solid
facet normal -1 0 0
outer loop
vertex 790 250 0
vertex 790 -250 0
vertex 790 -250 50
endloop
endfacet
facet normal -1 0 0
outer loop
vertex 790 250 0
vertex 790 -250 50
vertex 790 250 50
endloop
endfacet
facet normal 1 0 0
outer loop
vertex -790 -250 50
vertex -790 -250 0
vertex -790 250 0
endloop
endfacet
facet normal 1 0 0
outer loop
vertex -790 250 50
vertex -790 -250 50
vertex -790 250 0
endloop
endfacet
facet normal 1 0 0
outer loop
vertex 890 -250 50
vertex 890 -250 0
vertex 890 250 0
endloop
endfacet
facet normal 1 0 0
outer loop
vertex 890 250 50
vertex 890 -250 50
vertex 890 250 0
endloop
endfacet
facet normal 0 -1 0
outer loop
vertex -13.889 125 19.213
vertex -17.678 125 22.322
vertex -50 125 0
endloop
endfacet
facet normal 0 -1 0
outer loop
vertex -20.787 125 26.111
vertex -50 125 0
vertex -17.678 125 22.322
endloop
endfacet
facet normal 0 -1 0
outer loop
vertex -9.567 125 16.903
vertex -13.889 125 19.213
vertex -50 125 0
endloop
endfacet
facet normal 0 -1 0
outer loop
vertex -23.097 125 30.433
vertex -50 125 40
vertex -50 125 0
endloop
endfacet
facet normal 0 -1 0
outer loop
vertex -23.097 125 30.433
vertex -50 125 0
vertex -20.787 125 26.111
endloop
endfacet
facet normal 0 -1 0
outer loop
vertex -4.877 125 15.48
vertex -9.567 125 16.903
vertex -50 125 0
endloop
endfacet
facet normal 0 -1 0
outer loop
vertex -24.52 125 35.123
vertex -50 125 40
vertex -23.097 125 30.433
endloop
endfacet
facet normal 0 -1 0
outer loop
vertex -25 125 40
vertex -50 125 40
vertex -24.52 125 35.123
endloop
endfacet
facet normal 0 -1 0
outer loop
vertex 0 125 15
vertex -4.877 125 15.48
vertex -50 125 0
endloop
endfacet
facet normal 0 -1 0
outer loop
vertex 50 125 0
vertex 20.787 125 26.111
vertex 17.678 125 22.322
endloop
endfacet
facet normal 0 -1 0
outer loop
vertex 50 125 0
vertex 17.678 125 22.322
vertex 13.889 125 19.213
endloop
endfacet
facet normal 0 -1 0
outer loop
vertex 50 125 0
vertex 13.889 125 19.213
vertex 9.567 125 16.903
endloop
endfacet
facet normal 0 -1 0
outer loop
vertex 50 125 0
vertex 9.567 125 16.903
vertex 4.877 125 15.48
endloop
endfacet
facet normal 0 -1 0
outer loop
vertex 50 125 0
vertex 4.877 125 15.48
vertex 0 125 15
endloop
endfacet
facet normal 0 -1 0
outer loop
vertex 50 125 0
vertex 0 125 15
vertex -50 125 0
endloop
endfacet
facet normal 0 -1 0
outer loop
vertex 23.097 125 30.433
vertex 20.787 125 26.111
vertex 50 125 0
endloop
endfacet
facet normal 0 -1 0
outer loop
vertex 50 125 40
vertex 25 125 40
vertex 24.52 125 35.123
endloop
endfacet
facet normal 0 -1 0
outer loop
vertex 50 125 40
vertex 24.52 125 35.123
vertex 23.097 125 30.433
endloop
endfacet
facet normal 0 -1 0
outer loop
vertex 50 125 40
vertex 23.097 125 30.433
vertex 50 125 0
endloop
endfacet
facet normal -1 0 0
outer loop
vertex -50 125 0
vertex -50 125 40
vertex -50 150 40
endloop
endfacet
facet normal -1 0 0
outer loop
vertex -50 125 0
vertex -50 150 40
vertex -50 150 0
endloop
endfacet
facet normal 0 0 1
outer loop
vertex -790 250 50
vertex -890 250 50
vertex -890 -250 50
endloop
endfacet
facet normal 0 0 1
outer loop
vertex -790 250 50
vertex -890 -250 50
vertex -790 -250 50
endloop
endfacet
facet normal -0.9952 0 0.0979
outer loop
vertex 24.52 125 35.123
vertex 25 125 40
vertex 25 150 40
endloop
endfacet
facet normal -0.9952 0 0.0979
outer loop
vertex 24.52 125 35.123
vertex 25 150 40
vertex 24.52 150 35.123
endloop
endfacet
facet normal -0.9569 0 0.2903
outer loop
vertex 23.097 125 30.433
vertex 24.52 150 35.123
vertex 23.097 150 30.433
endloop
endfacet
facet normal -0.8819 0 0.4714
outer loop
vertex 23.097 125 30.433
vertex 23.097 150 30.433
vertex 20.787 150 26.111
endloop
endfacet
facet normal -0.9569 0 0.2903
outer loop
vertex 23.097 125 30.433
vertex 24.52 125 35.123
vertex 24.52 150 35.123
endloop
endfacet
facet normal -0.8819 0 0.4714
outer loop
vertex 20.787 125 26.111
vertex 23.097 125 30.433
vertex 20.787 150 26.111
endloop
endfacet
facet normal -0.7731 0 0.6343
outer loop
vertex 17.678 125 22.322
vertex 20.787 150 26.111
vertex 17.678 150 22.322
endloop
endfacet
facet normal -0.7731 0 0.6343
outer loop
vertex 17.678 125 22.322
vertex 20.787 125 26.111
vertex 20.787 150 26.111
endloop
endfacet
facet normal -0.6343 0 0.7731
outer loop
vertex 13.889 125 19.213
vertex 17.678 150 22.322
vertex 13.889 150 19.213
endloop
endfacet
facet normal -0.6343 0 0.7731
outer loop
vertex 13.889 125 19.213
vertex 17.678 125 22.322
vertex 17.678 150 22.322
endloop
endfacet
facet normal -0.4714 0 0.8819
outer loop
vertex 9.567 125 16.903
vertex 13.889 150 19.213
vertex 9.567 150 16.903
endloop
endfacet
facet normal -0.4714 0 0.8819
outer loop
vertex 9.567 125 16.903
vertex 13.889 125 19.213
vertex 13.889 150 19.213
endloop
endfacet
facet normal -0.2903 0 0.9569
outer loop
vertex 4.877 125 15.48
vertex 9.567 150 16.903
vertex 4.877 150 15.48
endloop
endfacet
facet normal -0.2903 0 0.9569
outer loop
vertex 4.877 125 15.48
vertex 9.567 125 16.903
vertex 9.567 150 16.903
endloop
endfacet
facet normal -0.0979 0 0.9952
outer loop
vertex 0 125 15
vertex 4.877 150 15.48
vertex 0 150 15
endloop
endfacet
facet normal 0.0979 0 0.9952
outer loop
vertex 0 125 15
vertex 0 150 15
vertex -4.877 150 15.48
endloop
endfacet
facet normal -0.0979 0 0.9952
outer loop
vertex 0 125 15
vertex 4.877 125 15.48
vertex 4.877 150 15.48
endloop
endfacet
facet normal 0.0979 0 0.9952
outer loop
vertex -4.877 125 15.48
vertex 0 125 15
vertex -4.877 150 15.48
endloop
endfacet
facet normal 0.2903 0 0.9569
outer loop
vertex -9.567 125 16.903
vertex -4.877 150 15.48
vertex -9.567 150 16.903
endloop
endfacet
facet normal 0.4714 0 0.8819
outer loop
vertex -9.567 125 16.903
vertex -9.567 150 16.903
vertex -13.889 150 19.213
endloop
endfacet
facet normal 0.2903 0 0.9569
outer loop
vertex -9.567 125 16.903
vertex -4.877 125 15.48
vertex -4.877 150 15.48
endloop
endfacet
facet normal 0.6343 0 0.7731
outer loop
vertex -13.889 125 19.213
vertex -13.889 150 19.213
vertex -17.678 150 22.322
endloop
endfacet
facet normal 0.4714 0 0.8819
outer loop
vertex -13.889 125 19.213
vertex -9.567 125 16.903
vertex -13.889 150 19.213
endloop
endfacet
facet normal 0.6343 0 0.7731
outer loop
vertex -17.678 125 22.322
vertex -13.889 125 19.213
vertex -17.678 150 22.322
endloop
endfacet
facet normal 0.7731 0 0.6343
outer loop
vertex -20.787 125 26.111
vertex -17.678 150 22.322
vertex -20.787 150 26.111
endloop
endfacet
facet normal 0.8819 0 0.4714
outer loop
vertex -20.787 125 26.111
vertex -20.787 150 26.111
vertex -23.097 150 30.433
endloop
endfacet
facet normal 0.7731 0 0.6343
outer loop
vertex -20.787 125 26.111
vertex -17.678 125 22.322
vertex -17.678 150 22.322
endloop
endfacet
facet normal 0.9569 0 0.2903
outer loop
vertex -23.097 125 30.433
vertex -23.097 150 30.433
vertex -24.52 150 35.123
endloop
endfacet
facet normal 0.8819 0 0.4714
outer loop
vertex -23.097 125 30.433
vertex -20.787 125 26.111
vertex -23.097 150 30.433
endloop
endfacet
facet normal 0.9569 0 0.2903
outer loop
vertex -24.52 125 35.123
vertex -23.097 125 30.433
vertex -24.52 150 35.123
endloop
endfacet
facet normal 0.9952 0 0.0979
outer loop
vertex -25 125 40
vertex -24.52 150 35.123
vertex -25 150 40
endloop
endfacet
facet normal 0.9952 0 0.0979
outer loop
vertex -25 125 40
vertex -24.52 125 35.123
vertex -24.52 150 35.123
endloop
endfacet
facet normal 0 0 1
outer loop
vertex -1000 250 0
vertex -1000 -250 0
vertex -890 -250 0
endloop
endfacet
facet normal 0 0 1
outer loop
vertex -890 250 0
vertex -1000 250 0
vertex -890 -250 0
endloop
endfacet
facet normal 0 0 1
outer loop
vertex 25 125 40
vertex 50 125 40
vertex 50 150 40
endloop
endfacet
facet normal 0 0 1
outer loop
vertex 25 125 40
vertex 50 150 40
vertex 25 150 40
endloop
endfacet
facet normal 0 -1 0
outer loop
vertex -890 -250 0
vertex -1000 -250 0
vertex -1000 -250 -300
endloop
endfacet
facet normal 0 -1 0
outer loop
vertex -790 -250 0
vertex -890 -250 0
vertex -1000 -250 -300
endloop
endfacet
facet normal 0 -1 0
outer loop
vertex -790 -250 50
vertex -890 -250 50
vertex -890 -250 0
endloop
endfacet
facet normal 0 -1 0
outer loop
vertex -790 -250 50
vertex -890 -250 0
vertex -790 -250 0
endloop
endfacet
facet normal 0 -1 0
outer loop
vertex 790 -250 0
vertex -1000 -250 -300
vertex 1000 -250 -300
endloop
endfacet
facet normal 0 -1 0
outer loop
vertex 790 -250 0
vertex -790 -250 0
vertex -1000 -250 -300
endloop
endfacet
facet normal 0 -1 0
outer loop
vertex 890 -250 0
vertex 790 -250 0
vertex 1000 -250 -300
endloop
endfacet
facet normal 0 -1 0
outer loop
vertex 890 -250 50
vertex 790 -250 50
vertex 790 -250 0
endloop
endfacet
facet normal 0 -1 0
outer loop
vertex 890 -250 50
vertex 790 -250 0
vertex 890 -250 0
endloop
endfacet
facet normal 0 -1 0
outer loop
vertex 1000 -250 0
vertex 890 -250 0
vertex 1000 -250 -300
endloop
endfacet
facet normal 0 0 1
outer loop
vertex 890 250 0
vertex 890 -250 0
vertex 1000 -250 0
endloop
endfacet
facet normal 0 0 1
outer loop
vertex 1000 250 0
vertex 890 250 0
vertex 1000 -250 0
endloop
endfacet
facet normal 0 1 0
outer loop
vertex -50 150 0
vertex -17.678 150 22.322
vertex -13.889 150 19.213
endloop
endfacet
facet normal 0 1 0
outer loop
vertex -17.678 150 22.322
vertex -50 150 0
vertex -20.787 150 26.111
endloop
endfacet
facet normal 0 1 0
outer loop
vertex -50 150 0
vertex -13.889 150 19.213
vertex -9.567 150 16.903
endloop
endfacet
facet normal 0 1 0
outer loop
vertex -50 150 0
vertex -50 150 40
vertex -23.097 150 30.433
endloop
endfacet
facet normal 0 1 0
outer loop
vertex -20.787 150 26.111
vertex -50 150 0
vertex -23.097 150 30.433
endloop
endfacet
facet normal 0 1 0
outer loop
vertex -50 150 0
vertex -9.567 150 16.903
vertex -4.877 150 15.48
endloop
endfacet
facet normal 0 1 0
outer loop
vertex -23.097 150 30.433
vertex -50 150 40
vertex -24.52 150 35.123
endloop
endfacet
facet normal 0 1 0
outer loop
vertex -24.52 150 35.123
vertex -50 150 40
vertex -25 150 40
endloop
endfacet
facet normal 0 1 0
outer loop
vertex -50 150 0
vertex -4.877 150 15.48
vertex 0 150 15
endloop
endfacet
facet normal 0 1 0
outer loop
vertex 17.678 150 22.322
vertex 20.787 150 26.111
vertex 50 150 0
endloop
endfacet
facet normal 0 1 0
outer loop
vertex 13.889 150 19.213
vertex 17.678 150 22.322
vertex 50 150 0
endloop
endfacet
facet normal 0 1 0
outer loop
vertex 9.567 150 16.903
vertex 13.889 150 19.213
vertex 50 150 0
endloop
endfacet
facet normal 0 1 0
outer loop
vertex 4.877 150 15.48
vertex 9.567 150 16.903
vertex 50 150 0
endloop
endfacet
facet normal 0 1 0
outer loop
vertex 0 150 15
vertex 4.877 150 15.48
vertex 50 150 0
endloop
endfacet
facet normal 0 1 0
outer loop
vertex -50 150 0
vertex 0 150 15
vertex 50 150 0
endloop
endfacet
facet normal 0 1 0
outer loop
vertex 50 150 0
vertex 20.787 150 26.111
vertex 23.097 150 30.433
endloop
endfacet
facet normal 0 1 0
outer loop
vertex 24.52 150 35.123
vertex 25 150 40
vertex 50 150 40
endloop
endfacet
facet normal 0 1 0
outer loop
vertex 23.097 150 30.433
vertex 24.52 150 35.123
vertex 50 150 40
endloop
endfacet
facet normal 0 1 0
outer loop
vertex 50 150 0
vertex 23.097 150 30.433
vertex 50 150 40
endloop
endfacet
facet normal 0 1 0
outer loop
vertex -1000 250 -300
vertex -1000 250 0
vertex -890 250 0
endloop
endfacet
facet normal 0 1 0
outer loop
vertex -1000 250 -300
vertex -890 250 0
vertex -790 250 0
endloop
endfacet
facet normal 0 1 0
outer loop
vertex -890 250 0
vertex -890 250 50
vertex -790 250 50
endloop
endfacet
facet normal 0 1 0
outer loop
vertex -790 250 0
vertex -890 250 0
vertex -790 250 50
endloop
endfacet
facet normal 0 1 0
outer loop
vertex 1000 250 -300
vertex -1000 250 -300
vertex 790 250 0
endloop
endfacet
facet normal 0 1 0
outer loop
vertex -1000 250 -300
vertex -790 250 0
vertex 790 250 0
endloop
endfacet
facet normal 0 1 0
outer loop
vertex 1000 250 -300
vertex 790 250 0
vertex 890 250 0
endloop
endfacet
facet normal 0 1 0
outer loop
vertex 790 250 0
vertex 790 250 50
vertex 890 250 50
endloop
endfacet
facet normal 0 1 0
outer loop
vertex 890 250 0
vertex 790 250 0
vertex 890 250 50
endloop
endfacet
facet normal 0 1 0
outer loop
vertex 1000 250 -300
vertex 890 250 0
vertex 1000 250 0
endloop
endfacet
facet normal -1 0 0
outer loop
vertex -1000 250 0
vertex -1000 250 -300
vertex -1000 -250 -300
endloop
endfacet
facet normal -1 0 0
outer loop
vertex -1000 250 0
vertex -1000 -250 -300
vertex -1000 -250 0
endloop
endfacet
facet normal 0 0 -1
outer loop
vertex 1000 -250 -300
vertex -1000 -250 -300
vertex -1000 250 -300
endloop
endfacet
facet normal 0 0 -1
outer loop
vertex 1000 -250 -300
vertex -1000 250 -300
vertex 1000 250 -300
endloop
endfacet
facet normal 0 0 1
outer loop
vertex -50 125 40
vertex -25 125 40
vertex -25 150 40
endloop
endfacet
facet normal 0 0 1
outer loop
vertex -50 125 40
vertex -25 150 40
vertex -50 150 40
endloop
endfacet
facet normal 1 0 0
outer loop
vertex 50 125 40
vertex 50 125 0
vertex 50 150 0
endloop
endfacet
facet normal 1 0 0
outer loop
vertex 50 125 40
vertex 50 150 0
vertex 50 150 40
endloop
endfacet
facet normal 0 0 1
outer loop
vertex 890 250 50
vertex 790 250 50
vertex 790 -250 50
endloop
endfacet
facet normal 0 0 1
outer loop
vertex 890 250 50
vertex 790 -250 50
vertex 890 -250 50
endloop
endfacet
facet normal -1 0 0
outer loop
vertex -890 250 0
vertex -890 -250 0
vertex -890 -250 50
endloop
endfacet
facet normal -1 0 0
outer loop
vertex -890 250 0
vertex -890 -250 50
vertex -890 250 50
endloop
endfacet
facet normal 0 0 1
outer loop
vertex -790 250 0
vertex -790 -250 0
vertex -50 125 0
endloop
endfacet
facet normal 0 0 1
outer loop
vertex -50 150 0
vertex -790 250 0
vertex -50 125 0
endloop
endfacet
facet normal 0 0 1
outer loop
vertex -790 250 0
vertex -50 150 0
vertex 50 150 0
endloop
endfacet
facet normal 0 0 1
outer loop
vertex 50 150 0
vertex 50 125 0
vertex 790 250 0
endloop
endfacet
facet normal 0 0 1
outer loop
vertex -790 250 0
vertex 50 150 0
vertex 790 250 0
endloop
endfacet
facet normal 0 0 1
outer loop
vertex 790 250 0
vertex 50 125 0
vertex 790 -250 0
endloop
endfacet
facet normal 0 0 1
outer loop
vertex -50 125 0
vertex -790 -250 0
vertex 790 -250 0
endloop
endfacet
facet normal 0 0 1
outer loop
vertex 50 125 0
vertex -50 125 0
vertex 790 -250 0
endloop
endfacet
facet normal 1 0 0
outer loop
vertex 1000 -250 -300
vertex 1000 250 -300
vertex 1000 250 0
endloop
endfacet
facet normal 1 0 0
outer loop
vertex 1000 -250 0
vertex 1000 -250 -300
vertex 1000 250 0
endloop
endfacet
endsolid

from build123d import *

# Parameters (mm, degrees)
F0_W     = 2000
F0_H     = 300
F1_DEPTH = 250
F2_W     = 100
F2_H     = 500
F3_DEPTH = 50
F5_START = -375
F5_DEPTH = 25


with BuildPart() as f1:
    # F0 (on Front) → F1 (new body, symmetric)
    with BuildSketch(Plane.XZ):
        with Locations((0, -150)):
            Rectangle(F0_W, F0_H)
    extrude(amount=F1_DEPTH, both=True)

    # F2 (on face) → F3 (join)
    with BuildSketch(Plane.XY):
        with Locations((840, 0)):
            Rectangle(F2_W, F2_H)
        with Locations((-840, 0)):
            Rectangle(F2_W, F2_H)
    extrude(amount=F3_DEPTH)

    # F4 (on face) → F5 (join)
    with BuildSketch(Plane.XZ.offset(250).offset(F5_START)):
        with BuildLine():
            ThreePointArc((25, 40), (0, 15), (-25, 40))
            Line((-25, 40), (-50, 40))
            Line((-50, 40), (-50, 0))
            Line((-50, 0), (50, 0))
            Line((50, 0), (50, 40))
            Line((50, 40), (25, 40))
        make_face()
    extrude(amount=-F5_DEPTH)


solid = f1.part
